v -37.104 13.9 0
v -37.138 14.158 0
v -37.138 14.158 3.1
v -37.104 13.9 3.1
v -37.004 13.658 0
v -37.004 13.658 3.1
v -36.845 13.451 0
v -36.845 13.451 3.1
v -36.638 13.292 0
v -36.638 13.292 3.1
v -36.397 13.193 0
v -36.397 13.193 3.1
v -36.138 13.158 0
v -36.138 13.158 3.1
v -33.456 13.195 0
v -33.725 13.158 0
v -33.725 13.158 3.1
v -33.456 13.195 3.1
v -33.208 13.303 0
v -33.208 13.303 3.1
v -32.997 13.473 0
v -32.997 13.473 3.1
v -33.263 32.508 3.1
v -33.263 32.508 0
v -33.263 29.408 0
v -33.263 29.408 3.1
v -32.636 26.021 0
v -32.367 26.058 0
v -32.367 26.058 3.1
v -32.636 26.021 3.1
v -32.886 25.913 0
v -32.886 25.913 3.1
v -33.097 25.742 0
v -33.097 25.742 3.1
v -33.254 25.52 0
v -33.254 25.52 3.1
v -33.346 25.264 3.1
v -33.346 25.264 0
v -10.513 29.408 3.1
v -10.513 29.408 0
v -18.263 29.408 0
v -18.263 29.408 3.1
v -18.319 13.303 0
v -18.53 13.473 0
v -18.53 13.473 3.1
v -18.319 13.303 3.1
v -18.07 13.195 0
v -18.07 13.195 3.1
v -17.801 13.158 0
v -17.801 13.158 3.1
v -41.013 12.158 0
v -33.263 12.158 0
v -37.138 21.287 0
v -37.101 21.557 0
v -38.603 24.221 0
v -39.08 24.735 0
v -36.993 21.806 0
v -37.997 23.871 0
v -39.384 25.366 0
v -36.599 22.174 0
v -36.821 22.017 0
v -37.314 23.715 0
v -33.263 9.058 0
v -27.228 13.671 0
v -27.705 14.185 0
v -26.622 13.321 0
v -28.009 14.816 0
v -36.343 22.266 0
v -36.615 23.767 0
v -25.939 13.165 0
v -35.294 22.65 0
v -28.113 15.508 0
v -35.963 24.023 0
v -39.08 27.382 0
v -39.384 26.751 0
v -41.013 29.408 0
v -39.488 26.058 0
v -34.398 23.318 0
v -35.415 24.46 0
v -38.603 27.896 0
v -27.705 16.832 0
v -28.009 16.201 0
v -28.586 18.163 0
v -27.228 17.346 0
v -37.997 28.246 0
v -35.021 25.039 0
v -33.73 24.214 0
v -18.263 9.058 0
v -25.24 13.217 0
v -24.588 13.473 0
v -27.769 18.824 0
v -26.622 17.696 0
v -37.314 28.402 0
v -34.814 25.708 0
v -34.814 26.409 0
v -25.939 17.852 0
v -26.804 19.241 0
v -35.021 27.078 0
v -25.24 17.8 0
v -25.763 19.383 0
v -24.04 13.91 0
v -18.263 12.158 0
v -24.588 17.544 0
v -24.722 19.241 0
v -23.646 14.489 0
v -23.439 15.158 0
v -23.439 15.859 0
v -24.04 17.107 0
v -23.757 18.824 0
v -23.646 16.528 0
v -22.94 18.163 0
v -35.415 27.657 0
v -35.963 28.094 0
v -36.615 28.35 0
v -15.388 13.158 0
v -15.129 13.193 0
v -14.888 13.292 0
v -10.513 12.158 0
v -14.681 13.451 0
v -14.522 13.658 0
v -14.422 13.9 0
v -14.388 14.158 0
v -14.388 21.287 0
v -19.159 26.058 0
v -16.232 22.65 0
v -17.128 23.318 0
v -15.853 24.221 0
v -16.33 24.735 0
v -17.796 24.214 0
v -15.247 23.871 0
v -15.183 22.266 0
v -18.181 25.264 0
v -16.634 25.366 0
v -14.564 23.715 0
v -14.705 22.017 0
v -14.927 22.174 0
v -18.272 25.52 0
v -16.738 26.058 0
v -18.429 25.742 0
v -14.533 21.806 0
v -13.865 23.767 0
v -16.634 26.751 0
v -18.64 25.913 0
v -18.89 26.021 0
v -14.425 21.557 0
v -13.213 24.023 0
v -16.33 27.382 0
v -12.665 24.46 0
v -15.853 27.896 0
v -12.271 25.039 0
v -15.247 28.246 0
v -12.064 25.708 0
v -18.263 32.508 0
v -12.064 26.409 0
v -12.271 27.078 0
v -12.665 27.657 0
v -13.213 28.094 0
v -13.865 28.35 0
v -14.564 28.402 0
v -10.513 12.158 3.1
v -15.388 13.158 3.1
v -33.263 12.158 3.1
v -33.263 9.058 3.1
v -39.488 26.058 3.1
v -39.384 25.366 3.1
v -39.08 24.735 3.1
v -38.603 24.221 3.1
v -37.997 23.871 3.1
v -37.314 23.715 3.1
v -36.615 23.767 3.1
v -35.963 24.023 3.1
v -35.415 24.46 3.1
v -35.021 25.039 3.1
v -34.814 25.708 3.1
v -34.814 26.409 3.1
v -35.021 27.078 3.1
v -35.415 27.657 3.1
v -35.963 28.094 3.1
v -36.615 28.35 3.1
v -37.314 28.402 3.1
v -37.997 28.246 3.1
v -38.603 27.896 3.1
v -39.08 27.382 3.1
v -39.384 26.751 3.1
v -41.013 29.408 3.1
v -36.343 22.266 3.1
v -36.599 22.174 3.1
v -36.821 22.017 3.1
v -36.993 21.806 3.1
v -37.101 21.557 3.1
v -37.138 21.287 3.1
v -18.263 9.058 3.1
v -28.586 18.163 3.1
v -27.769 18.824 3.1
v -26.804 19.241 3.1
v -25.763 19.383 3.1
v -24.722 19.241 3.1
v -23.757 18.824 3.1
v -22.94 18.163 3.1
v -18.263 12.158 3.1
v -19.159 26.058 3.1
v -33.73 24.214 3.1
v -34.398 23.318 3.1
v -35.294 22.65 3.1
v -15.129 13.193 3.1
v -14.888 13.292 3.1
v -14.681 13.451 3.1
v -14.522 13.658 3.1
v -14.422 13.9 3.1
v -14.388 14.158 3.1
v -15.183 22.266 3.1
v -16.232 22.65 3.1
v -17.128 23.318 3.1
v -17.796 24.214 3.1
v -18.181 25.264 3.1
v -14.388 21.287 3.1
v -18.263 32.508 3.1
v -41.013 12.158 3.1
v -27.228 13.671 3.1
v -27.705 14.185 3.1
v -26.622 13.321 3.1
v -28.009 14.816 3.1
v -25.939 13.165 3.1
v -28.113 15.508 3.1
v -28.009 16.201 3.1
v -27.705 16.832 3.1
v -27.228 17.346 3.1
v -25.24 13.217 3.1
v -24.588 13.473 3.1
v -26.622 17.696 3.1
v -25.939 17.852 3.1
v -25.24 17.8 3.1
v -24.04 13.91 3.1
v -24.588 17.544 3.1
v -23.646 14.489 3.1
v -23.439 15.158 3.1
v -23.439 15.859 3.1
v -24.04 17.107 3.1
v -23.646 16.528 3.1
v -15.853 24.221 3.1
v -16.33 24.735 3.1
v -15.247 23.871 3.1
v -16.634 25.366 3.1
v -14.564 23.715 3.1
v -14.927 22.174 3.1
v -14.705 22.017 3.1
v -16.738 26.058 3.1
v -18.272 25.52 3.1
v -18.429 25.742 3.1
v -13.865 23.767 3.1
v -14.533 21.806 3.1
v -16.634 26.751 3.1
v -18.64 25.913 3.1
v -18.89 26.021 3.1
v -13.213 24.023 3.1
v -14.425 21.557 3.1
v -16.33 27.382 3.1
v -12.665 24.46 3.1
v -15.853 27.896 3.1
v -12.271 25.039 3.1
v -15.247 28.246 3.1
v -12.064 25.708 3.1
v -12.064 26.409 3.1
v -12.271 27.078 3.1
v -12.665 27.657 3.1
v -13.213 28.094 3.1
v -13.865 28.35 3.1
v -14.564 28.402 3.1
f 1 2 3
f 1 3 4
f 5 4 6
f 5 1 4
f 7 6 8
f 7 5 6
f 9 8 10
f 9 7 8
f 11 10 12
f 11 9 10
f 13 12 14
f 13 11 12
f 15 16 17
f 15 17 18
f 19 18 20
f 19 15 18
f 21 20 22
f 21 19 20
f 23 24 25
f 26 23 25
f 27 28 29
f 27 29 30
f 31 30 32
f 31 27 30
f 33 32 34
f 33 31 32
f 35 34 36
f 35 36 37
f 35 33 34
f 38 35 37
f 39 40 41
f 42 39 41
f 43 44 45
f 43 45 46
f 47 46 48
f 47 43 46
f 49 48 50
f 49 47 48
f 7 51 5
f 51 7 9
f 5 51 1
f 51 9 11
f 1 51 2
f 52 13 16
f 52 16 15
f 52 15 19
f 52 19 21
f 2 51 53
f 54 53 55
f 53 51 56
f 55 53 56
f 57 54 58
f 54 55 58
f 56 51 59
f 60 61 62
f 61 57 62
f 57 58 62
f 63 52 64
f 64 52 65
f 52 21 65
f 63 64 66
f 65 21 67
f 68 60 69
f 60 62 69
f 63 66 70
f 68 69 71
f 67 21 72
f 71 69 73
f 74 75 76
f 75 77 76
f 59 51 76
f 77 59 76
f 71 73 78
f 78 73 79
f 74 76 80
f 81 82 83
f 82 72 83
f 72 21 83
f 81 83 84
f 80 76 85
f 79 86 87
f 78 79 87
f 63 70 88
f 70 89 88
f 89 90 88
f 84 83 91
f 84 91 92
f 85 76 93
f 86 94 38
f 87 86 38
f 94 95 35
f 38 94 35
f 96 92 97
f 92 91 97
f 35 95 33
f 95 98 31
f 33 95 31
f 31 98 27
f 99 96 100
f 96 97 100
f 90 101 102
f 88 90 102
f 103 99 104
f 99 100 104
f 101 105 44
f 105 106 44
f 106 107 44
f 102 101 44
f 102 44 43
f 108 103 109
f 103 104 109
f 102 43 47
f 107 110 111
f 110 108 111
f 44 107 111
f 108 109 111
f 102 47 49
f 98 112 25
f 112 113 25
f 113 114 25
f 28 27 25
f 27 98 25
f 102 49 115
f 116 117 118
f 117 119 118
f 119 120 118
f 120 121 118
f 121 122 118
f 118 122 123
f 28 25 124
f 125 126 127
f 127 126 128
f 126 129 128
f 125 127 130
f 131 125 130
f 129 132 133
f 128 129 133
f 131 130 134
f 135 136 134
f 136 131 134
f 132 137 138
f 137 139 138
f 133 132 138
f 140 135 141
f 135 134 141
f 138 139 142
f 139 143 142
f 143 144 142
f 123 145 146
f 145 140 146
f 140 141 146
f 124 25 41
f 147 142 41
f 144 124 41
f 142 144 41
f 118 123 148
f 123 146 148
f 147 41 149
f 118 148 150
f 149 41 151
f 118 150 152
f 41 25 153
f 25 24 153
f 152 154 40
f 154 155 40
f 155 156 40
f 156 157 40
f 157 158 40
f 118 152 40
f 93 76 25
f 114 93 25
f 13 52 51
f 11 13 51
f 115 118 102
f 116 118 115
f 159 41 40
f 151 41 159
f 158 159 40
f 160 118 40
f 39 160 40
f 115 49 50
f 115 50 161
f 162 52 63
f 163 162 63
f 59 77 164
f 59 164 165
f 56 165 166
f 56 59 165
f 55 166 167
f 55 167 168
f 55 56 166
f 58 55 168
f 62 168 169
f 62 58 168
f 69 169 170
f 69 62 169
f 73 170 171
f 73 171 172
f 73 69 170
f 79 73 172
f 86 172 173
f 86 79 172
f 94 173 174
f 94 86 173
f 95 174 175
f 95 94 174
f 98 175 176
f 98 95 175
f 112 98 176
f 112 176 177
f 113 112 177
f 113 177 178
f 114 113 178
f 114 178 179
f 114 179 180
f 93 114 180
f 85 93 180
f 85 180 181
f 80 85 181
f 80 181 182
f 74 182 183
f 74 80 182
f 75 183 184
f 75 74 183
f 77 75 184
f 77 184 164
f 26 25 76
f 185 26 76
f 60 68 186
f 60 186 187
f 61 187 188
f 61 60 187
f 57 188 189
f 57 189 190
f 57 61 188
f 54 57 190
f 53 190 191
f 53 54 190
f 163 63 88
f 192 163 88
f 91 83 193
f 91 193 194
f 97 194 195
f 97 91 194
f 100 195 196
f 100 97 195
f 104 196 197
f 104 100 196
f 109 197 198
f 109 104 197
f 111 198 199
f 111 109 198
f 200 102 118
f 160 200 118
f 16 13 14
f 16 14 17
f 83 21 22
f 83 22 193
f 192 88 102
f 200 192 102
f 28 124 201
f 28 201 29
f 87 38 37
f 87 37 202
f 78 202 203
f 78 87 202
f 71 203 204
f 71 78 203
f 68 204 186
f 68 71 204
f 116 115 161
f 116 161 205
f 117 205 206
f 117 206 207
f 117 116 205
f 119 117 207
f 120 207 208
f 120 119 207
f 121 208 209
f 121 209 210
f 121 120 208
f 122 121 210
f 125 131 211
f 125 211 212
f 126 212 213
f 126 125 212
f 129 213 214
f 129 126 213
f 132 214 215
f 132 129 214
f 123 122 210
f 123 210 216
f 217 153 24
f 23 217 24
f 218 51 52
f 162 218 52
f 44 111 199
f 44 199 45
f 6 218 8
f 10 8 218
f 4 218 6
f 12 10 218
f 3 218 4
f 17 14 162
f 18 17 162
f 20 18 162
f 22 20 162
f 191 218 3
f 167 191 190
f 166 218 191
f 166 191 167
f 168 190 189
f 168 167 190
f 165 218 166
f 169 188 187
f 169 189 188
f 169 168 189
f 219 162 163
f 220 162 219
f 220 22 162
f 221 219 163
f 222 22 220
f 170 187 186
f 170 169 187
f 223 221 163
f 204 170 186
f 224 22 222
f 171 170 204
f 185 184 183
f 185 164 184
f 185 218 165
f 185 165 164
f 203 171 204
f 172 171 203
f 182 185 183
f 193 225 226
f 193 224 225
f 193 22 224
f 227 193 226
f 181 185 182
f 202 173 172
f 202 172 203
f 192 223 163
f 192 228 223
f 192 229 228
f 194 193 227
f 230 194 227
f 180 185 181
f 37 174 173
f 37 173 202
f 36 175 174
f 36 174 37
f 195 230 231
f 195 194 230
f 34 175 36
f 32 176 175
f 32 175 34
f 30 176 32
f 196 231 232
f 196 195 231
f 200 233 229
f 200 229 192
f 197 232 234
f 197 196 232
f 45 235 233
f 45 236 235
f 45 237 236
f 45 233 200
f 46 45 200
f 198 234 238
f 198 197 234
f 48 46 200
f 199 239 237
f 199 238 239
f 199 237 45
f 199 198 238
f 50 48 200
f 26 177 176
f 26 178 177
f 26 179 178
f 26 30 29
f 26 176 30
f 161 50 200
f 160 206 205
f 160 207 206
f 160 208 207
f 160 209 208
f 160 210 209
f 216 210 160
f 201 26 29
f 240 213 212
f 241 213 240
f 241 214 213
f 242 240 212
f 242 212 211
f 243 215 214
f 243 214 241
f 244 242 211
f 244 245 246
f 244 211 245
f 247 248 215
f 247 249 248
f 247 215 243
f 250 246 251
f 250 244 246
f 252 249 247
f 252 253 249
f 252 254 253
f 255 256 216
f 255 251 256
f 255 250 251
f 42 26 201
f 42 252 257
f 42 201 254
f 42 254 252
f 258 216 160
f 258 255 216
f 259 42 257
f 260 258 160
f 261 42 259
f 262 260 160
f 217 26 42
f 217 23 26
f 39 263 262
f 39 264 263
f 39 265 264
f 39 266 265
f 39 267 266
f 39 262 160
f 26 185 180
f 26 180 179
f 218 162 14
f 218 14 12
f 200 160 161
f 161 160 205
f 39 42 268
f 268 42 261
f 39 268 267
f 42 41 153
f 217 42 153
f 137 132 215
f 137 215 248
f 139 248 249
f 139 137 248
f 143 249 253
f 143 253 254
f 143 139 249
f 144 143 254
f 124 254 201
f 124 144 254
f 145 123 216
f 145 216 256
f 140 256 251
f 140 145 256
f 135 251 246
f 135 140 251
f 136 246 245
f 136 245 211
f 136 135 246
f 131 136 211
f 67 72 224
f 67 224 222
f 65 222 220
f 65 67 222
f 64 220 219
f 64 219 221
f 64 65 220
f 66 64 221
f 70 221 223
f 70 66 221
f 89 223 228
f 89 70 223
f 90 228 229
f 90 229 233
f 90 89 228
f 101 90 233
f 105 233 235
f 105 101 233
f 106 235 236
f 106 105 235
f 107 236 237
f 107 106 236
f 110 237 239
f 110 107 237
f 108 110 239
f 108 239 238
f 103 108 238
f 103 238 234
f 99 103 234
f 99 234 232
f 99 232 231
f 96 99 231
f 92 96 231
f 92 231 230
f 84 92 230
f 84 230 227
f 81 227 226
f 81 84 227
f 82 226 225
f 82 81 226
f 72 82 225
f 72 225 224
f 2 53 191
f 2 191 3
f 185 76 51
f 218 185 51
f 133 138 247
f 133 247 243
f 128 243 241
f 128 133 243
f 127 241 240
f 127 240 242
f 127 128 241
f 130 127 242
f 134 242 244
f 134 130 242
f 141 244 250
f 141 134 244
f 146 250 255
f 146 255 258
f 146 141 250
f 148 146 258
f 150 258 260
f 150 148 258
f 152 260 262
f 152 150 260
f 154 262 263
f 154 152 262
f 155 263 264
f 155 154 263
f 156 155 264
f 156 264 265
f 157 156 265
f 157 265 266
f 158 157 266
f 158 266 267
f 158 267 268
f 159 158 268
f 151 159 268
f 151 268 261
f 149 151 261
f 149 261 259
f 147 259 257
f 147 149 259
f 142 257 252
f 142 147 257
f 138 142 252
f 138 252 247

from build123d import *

# Parameters (mm, degrees)
SKETCH1_R      = 2.35
EXTRUDE1_DEPTH = 3.1


with BuildPart() as part:
    # Sketch1 → Extrude1 (new body)
    with BuildSketch(Plane.XY):
        Polygon((-33.263157114, 29.408489293), (-41.013157114, 29.408489293), (-41.013157114, 12.158489293), (-33.263157114, 12.158489293), (-33.263157114, 9.058489293), (-18.263157114, 9.058489293), (-18.263157114, 12.158489293), (-10.513157114, 12.158489293), (-10.513157114, 29.408489293), (-18.263157114, 29.408489293), (-18.263157114, 32.508489293), (-33.263157114, 32.508489293), align=None)
        with Locations(Location((-14.388157114, 26.058489293, 0), (0, 0, 180))):
            Circle(SKETCH1_R, mode=Mode.SUBTRACT)
        with Locations(Location((-37.138157114, 26.058489293, 0), (0, 0, 180))):
            Circle(SKETCH1_R, mode=Mode.SUBTRACT)
        with Locations(Location((-25.763157114, 15.508489293, 0), (0, 0, 180))):
            Circle(SKETCH1_R, mode=Mode.SUBTRACT)
        with BuildLine():
            Line((-37.138157114, 21.287155622), (-37.138157114, 14.158489293))
            ThreePointArc((-37.138157114, 14.158489293), (-36.845263895, 13.451382512), (-36.138157114, 13.158489293))
            Line((-36.138157114, 13.158489293), (-33.725119975, 13.158489293))
            ThreePointArc((-33.725119975, 13.158489293), (-33.328320215, 13.240584097), (-32.996670851, 13.473389392))
            Line((-32.996670851, 13.473389392), (-28.585897467, 18.16325141))
            ThreePointArc((-28.585897467, 18.16325141), (-25.763157114, 19.383489293), (-22.940416761, 18.16325141))
            Line((-22.940416761, 18.16325141), (-18.529643377, 13.473389392))
            ThreePointArc((-18.529643377, 13.473389392), (-18.197994013, 13.240584097), (-17.801194253, 13.158489293))
            Line((-17.801194253, 13.158489293), (-15.388157114, 13.158489293))
            ThreePointArc((-15.388157114, 13.158489293), (-14.681050333, 13.451382512), (-14.388157114, 14.158489293))
            Line((-14.388157114, 14.158489293), (-14.388157114, 21.287155622))
            ThreePointArc((-14.388157114, 21.287155622), (-14.611907088, 21.917580794), (-15.183028909, 22.265890734))
            ThreePointArc((-15.183028909, 22.265890734), (-17.128195891, 23.318450516), (-18.180755673, 25.263617499))
            ThreePointArc((-18.180755673, 25.263617499), (-18.529065613, 25.834739319), (-19.159490785, 26.058489293))
            Line((-19.159490785, 26.058489293), (-32.366823443, 26.058489293))
            ThreePointArc((-32.366823443, 26.058489293), (-32.997248615, 25.834739319), (-33.345558555, 25.263617499))
            ThreePointArc((-33.345558555, 25.263617499), (-34.398118337, 23.318450516), (-36.343285319, 22.265890734))
            ThreePointArc((-36.343285319, 22.265890734), (-36.91440714, 21.917580794), (-37.138157114, 21.287155622))
        make_face(mode=Mode.SUBTRACT)
    extrude(amount=EXTRUDE1_DEPTH)


solid = part.part
